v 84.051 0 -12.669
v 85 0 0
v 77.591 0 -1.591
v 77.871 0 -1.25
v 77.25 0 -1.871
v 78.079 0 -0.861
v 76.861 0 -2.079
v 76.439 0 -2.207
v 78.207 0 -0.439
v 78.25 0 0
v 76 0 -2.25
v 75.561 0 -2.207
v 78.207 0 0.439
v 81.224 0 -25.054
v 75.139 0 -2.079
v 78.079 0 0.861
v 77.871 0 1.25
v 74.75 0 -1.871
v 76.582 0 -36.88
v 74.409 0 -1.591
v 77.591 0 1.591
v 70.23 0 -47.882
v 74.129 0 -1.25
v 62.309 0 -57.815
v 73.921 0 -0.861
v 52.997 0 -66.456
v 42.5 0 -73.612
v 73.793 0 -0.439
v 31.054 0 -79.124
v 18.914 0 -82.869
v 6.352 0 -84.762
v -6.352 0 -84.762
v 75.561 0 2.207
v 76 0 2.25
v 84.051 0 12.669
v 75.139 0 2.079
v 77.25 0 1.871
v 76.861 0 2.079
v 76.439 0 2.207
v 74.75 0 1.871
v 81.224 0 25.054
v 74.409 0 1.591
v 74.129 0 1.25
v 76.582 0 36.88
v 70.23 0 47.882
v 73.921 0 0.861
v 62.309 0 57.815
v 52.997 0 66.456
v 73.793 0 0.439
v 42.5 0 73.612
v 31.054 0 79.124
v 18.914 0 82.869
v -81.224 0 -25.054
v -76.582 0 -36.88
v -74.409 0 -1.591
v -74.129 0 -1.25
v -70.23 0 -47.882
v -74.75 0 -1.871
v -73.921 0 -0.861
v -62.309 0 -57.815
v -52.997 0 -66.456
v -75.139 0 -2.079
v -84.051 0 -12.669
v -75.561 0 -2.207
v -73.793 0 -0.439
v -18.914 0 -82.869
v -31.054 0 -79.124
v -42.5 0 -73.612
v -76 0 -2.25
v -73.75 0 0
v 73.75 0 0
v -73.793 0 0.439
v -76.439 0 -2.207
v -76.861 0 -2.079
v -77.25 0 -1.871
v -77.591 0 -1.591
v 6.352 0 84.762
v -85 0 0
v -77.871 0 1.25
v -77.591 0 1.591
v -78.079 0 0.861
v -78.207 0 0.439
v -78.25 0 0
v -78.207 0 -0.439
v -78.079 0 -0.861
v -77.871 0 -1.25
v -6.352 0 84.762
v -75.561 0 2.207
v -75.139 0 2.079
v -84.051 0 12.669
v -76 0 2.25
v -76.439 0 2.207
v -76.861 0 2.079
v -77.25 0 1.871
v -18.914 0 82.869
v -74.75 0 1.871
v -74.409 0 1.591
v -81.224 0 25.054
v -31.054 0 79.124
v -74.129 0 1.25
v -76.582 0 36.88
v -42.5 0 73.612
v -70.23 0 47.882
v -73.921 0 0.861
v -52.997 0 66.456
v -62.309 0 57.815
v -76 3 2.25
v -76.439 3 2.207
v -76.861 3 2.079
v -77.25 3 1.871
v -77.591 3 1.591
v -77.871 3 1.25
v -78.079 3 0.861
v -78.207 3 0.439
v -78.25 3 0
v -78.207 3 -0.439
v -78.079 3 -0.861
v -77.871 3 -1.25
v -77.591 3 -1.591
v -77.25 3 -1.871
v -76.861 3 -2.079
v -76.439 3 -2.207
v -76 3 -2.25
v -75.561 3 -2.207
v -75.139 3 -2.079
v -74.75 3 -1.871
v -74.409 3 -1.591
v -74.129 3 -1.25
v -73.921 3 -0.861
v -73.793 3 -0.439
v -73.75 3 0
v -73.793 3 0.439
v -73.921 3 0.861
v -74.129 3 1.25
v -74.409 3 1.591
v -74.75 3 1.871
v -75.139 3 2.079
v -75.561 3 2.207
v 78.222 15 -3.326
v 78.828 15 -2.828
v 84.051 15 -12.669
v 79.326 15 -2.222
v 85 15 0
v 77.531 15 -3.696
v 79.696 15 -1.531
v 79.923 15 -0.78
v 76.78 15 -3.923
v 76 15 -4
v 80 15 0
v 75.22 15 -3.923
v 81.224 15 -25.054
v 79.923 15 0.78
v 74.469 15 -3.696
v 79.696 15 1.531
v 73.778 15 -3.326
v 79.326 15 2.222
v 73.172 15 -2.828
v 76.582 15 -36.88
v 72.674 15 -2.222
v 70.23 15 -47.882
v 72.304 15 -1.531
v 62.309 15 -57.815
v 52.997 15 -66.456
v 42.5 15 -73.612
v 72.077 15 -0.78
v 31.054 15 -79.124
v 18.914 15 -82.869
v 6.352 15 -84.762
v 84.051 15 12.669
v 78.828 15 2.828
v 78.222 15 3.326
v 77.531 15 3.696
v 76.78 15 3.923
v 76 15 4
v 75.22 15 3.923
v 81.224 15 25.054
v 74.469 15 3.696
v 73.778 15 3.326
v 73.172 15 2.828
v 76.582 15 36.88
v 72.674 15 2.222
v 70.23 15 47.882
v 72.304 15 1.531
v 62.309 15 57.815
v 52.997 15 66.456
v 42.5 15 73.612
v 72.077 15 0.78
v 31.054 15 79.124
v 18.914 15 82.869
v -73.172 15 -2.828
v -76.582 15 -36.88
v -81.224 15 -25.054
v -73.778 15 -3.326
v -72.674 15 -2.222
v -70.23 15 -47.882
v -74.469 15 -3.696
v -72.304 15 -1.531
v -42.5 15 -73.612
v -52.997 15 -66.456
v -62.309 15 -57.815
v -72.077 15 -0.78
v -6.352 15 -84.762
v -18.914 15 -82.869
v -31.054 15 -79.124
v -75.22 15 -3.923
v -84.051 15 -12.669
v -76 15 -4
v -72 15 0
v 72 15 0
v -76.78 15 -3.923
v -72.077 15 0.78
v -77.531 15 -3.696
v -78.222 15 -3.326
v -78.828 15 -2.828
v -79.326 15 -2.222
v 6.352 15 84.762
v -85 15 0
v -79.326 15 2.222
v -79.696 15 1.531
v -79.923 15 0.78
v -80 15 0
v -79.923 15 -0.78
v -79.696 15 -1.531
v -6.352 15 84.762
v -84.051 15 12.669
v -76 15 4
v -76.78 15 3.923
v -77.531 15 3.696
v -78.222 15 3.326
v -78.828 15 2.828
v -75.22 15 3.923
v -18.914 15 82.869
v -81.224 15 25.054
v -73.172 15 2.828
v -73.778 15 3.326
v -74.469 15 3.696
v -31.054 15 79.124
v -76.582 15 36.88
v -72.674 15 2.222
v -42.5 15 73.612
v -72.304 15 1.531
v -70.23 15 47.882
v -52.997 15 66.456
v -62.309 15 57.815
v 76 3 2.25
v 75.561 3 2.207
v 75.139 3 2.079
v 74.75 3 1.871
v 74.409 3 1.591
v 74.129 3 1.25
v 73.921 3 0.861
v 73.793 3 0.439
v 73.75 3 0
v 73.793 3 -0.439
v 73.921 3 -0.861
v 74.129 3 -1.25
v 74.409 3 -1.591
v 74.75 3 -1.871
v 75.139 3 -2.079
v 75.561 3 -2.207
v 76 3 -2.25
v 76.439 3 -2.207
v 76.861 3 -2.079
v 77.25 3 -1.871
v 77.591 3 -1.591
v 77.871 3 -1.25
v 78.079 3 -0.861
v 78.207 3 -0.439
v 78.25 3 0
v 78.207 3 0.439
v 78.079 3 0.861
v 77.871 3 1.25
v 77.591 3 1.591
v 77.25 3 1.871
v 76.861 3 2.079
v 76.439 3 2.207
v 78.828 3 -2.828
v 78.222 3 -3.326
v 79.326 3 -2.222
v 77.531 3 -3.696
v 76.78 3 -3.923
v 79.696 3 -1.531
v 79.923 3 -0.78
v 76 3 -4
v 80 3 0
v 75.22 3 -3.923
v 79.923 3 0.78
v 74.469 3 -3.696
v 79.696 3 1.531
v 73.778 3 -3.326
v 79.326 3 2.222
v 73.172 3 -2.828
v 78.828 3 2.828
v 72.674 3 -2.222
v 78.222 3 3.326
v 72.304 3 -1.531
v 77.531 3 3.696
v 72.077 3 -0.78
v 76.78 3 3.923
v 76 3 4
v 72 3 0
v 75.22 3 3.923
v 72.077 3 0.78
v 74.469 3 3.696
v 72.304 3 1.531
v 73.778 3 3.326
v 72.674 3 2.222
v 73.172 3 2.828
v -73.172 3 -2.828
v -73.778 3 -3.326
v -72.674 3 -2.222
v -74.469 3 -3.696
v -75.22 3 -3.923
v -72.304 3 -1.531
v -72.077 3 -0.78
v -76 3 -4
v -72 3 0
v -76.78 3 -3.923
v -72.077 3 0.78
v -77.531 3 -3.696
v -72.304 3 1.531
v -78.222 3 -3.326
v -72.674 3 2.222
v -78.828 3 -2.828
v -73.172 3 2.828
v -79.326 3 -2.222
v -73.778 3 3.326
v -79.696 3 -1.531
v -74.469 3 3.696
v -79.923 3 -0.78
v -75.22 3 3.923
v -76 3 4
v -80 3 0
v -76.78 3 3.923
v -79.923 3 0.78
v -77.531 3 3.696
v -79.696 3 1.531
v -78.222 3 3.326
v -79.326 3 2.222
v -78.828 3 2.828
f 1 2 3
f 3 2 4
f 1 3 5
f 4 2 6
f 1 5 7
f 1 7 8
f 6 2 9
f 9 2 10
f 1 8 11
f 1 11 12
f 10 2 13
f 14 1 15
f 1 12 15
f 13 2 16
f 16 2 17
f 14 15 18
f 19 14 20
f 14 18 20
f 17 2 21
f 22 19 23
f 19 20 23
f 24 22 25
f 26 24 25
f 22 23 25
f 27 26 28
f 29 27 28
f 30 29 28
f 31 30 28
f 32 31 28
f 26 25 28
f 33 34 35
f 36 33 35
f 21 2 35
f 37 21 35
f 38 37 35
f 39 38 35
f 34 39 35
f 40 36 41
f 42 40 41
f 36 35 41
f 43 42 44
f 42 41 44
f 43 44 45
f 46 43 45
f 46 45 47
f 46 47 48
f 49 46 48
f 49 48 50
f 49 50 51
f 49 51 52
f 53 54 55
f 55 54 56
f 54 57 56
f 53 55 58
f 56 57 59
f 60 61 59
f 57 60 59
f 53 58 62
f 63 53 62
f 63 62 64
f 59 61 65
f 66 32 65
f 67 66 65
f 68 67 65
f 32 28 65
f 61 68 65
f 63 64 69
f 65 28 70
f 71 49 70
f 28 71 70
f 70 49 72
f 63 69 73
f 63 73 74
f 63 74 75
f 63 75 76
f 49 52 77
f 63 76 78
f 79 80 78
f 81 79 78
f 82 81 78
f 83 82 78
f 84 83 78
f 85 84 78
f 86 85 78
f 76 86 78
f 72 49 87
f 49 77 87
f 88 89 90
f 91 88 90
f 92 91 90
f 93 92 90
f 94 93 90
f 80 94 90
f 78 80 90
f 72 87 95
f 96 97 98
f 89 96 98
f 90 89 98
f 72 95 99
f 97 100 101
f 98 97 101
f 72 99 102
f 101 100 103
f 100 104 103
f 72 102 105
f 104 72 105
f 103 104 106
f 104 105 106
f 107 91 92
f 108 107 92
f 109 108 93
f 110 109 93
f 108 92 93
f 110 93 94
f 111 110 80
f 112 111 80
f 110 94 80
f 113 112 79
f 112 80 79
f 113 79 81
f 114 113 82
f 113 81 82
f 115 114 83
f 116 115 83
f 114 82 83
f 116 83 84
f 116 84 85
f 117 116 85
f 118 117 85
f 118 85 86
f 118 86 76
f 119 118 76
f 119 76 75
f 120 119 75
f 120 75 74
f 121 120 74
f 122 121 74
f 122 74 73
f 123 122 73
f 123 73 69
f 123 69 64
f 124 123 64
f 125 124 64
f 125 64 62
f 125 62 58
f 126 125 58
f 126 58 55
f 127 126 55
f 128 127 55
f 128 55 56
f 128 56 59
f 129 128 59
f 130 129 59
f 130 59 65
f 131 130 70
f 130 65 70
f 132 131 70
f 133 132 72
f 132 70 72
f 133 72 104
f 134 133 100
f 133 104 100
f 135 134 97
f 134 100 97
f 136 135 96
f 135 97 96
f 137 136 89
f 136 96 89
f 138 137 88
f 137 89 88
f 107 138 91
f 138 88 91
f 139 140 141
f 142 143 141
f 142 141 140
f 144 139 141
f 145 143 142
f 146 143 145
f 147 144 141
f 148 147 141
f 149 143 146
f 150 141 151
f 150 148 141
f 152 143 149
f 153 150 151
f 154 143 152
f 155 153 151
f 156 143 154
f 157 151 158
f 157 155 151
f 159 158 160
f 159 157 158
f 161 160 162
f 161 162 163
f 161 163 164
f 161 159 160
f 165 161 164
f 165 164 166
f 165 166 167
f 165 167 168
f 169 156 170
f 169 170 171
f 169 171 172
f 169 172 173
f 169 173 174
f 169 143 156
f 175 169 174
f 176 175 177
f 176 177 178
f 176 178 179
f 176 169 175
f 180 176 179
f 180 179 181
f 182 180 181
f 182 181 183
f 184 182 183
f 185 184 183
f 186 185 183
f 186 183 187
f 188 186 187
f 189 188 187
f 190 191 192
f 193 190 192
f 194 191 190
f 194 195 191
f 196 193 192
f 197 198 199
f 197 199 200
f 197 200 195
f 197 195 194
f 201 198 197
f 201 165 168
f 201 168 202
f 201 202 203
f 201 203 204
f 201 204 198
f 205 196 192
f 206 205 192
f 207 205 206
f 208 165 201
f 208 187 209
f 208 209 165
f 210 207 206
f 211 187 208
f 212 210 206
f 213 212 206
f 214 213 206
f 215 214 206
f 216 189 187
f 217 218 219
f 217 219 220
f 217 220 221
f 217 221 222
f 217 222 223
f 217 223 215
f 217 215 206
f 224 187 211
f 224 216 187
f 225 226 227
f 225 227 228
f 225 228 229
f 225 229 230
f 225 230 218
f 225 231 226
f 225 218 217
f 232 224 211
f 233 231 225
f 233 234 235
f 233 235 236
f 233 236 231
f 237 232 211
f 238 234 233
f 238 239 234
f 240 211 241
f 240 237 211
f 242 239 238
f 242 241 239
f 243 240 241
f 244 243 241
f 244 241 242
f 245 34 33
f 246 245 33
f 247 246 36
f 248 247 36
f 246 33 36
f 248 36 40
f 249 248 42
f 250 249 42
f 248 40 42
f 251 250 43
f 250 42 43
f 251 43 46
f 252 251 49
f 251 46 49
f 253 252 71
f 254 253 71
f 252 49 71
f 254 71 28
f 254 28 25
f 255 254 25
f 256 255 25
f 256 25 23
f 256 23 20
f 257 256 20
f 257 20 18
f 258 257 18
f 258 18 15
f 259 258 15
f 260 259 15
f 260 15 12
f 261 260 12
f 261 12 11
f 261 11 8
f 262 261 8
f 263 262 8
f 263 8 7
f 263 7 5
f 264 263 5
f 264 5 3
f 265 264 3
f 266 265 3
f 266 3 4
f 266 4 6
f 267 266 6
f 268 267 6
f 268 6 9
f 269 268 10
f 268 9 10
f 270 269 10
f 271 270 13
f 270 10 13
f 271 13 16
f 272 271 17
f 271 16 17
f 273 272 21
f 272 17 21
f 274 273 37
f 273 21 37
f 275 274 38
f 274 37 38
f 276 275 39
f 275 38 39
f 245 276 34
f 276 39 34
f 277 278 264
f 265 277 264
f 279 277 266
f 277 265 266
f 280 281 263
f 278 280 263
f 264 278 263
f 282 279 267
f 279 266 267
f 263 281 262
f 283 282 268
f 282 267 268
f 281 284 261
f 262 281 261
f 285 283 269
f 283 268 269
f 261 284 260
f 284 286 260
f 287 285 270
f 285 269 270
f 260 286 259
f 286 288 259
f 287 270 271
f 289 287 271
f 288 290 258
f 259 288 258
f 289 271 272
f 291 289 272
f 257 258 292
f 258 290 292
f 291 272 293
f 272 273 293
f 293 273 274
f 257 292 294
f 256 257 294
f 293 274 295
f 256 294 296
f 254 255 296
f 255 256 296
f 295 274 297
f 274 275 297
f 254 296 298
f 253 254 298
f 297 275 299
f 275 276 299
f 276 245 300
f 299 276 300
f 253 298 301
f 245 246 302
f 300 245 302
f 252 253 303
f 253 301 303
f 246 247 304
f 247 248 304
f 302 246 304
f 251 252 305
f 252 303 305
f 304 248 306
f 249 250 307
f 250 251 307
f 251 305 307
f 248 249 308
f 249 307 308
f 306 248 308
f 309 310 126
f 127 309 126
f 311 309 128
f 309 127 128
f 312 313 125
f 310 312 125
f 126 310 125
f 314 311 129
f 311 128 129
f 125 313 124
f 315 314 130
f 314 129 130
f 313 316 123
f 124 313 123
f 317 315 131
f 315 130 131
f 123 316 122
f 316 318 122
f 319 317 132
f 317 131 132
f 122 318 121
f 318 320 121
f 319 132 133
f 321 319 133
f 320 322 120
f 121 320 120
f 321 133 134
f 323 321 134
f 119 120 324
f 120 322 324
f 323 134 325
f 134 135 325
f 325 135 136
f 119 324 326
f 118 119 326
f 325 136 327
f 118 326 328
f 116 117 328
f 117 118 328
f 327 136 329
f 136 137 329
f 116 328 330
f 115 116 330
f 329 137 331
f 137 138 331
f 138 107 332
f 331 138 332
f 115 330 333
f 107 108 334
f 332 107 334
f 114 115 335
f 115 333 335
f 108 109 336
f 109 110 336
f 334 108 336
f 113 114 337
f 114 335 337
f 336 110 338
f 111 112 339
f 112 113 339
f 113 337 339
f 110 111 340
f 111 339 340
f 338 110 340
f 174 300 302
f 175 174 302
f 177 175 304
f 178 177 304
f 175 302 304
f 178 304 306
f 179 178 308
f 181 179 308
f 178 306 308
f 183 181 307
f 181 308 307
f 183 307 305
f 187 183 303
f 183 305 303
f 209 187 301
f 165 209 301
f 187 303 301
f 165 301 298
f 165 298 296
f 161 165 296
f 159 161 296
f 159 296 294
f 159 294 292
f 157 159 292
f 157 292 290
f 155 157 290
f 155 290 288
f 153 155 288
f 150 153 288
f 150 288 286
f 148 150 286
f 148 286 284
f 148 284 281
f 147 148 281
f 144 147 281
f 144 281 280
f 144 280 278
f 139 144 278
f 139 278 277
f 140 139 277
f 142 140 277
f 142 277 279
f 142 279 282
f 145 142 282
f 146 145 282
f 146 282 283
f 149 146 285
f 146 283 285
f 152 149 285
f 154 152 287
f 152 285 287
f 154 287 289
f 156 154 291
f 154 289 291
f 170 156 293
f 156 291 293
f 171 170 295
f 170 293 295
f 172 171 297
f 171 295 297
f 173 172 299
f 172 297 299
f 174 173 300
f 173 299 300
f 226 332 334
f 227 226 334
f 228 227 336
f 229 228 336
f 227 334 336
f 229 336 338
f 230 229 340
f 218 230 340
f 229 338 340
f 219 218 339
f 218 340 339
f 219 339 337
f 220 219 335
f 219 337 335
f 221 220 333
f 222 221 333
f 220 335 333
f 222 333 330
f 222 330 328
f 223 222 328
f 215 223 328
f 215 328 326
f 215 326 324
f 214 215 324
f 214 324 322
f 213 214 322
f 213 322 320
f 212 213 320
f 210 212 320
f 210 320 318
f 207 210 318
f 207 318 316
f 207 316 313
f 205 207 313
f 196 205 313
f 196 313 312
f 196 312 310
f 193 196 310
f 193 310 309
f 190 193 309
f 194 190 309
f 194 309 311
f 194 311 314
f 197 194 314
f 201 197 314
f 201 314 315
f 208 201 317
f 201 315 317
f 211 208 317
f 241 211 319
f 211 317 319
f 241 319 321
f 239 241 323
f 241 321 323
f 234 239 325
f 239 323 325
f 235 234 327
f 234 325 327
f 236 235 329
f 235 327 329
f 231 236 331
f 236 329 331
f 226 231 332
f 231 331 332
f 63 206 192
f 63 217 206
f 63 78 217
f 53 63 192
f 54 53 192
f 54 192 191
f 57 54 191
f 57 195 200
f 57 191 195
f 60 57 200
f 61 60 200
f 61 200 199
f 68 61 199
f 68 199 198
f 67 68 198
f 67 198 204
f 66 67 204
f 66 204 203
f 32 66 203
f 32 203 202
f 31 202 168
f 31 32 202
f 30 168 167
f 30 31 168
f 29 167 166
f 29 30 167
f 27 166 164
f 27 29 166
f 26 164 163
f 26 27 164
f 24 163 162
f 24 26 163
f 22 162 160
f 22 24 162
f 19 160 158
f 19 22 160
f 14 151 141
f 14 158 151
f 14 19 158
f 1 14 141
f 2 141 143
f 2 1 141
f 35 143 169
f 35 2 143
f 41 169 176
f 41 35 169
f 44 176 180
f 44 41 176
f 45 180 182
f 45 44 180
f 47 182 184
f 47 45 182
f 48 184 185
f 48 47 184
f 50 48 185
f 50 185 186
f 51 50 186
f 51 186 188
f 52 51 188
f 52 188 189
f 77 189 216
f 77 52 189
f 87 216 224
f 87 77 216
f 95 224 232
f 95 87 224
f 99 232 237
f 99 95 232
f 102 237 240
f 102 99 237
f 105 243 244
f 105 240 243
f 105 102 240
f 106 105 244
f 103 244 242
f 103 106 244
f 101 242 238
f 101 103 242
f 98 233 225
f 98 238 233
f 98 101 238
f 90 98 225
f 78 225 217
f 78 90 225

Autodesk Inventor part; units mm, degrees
ref_plane "YZ Plane" through (0, 0, 0) normal (1, 0, 0) x (0, 1, 0)
ref_plane "XZ Plane" through (0, 0, 0) normal (0, 1, 0) x (-1, 0, 0)
ref_plane "XY Plane" through (0, 0, 0) normal (0, 0, 1) x (1, 0, 0)
sketch "Sketch1" plane through (0, 0, 0) normal (0, 1, 0) x (-1, 0, 0)
  circle A0 centre (0, 0) radius 85
  dimension "d0" = 170
extrude "Extrusion1" add sketch "Sketch1" along normal blind 15
sketch "Sketch2" plane through (0, 15, 0) normal (0, 1, 0) x (1, 0, 0)
  circle A0 centre (0, 0) radius 85 projected
  line L0 (51, -22.7944) -> (-51, -22.7944)
  line L1 (-56, 50.2056) -> (56, 50.2056)
  line L2 (0, 119) -> (0, -119) projected
  line L3 (-56, 50.2056) -> (51, -22.7944) construction
  line L4 (56, 50.2056) -> (-51, -22.7944) construction
  line L5 (-56, 50.2056) -> (-51, -22.7944)
  line L6 (56, 50.2056) -> (51, -22.7944)
  line L7 (-119, 0) -> (119, 0) projected
  point P0 (0, -22.7944)
  point P1 (0, 50.2056)
  point P2 (0, 12)
  dimension "d4" = 112
  dimension "d5" = 73
  dimension "d7" = 102
  dimension "d9" = 12
sketch "Sketch3" plane through (0, 15, 0) normal (0, 1, 0) x (1, 0, 0)
  circle A0 centre (0, 0) radius 76
  point P0 (-76, 0)
  point P1 (76, 0)
  dimension "d10" = 152
hole "Hole1" at (-76, 15, 0) at (76, 15, 0) direction (0, -1, 0) diameter 4.5 depth 15 counterbore diameter 8 counterbore depth 12
properties part number "Build Plate with 35mm FOV Sketch"
